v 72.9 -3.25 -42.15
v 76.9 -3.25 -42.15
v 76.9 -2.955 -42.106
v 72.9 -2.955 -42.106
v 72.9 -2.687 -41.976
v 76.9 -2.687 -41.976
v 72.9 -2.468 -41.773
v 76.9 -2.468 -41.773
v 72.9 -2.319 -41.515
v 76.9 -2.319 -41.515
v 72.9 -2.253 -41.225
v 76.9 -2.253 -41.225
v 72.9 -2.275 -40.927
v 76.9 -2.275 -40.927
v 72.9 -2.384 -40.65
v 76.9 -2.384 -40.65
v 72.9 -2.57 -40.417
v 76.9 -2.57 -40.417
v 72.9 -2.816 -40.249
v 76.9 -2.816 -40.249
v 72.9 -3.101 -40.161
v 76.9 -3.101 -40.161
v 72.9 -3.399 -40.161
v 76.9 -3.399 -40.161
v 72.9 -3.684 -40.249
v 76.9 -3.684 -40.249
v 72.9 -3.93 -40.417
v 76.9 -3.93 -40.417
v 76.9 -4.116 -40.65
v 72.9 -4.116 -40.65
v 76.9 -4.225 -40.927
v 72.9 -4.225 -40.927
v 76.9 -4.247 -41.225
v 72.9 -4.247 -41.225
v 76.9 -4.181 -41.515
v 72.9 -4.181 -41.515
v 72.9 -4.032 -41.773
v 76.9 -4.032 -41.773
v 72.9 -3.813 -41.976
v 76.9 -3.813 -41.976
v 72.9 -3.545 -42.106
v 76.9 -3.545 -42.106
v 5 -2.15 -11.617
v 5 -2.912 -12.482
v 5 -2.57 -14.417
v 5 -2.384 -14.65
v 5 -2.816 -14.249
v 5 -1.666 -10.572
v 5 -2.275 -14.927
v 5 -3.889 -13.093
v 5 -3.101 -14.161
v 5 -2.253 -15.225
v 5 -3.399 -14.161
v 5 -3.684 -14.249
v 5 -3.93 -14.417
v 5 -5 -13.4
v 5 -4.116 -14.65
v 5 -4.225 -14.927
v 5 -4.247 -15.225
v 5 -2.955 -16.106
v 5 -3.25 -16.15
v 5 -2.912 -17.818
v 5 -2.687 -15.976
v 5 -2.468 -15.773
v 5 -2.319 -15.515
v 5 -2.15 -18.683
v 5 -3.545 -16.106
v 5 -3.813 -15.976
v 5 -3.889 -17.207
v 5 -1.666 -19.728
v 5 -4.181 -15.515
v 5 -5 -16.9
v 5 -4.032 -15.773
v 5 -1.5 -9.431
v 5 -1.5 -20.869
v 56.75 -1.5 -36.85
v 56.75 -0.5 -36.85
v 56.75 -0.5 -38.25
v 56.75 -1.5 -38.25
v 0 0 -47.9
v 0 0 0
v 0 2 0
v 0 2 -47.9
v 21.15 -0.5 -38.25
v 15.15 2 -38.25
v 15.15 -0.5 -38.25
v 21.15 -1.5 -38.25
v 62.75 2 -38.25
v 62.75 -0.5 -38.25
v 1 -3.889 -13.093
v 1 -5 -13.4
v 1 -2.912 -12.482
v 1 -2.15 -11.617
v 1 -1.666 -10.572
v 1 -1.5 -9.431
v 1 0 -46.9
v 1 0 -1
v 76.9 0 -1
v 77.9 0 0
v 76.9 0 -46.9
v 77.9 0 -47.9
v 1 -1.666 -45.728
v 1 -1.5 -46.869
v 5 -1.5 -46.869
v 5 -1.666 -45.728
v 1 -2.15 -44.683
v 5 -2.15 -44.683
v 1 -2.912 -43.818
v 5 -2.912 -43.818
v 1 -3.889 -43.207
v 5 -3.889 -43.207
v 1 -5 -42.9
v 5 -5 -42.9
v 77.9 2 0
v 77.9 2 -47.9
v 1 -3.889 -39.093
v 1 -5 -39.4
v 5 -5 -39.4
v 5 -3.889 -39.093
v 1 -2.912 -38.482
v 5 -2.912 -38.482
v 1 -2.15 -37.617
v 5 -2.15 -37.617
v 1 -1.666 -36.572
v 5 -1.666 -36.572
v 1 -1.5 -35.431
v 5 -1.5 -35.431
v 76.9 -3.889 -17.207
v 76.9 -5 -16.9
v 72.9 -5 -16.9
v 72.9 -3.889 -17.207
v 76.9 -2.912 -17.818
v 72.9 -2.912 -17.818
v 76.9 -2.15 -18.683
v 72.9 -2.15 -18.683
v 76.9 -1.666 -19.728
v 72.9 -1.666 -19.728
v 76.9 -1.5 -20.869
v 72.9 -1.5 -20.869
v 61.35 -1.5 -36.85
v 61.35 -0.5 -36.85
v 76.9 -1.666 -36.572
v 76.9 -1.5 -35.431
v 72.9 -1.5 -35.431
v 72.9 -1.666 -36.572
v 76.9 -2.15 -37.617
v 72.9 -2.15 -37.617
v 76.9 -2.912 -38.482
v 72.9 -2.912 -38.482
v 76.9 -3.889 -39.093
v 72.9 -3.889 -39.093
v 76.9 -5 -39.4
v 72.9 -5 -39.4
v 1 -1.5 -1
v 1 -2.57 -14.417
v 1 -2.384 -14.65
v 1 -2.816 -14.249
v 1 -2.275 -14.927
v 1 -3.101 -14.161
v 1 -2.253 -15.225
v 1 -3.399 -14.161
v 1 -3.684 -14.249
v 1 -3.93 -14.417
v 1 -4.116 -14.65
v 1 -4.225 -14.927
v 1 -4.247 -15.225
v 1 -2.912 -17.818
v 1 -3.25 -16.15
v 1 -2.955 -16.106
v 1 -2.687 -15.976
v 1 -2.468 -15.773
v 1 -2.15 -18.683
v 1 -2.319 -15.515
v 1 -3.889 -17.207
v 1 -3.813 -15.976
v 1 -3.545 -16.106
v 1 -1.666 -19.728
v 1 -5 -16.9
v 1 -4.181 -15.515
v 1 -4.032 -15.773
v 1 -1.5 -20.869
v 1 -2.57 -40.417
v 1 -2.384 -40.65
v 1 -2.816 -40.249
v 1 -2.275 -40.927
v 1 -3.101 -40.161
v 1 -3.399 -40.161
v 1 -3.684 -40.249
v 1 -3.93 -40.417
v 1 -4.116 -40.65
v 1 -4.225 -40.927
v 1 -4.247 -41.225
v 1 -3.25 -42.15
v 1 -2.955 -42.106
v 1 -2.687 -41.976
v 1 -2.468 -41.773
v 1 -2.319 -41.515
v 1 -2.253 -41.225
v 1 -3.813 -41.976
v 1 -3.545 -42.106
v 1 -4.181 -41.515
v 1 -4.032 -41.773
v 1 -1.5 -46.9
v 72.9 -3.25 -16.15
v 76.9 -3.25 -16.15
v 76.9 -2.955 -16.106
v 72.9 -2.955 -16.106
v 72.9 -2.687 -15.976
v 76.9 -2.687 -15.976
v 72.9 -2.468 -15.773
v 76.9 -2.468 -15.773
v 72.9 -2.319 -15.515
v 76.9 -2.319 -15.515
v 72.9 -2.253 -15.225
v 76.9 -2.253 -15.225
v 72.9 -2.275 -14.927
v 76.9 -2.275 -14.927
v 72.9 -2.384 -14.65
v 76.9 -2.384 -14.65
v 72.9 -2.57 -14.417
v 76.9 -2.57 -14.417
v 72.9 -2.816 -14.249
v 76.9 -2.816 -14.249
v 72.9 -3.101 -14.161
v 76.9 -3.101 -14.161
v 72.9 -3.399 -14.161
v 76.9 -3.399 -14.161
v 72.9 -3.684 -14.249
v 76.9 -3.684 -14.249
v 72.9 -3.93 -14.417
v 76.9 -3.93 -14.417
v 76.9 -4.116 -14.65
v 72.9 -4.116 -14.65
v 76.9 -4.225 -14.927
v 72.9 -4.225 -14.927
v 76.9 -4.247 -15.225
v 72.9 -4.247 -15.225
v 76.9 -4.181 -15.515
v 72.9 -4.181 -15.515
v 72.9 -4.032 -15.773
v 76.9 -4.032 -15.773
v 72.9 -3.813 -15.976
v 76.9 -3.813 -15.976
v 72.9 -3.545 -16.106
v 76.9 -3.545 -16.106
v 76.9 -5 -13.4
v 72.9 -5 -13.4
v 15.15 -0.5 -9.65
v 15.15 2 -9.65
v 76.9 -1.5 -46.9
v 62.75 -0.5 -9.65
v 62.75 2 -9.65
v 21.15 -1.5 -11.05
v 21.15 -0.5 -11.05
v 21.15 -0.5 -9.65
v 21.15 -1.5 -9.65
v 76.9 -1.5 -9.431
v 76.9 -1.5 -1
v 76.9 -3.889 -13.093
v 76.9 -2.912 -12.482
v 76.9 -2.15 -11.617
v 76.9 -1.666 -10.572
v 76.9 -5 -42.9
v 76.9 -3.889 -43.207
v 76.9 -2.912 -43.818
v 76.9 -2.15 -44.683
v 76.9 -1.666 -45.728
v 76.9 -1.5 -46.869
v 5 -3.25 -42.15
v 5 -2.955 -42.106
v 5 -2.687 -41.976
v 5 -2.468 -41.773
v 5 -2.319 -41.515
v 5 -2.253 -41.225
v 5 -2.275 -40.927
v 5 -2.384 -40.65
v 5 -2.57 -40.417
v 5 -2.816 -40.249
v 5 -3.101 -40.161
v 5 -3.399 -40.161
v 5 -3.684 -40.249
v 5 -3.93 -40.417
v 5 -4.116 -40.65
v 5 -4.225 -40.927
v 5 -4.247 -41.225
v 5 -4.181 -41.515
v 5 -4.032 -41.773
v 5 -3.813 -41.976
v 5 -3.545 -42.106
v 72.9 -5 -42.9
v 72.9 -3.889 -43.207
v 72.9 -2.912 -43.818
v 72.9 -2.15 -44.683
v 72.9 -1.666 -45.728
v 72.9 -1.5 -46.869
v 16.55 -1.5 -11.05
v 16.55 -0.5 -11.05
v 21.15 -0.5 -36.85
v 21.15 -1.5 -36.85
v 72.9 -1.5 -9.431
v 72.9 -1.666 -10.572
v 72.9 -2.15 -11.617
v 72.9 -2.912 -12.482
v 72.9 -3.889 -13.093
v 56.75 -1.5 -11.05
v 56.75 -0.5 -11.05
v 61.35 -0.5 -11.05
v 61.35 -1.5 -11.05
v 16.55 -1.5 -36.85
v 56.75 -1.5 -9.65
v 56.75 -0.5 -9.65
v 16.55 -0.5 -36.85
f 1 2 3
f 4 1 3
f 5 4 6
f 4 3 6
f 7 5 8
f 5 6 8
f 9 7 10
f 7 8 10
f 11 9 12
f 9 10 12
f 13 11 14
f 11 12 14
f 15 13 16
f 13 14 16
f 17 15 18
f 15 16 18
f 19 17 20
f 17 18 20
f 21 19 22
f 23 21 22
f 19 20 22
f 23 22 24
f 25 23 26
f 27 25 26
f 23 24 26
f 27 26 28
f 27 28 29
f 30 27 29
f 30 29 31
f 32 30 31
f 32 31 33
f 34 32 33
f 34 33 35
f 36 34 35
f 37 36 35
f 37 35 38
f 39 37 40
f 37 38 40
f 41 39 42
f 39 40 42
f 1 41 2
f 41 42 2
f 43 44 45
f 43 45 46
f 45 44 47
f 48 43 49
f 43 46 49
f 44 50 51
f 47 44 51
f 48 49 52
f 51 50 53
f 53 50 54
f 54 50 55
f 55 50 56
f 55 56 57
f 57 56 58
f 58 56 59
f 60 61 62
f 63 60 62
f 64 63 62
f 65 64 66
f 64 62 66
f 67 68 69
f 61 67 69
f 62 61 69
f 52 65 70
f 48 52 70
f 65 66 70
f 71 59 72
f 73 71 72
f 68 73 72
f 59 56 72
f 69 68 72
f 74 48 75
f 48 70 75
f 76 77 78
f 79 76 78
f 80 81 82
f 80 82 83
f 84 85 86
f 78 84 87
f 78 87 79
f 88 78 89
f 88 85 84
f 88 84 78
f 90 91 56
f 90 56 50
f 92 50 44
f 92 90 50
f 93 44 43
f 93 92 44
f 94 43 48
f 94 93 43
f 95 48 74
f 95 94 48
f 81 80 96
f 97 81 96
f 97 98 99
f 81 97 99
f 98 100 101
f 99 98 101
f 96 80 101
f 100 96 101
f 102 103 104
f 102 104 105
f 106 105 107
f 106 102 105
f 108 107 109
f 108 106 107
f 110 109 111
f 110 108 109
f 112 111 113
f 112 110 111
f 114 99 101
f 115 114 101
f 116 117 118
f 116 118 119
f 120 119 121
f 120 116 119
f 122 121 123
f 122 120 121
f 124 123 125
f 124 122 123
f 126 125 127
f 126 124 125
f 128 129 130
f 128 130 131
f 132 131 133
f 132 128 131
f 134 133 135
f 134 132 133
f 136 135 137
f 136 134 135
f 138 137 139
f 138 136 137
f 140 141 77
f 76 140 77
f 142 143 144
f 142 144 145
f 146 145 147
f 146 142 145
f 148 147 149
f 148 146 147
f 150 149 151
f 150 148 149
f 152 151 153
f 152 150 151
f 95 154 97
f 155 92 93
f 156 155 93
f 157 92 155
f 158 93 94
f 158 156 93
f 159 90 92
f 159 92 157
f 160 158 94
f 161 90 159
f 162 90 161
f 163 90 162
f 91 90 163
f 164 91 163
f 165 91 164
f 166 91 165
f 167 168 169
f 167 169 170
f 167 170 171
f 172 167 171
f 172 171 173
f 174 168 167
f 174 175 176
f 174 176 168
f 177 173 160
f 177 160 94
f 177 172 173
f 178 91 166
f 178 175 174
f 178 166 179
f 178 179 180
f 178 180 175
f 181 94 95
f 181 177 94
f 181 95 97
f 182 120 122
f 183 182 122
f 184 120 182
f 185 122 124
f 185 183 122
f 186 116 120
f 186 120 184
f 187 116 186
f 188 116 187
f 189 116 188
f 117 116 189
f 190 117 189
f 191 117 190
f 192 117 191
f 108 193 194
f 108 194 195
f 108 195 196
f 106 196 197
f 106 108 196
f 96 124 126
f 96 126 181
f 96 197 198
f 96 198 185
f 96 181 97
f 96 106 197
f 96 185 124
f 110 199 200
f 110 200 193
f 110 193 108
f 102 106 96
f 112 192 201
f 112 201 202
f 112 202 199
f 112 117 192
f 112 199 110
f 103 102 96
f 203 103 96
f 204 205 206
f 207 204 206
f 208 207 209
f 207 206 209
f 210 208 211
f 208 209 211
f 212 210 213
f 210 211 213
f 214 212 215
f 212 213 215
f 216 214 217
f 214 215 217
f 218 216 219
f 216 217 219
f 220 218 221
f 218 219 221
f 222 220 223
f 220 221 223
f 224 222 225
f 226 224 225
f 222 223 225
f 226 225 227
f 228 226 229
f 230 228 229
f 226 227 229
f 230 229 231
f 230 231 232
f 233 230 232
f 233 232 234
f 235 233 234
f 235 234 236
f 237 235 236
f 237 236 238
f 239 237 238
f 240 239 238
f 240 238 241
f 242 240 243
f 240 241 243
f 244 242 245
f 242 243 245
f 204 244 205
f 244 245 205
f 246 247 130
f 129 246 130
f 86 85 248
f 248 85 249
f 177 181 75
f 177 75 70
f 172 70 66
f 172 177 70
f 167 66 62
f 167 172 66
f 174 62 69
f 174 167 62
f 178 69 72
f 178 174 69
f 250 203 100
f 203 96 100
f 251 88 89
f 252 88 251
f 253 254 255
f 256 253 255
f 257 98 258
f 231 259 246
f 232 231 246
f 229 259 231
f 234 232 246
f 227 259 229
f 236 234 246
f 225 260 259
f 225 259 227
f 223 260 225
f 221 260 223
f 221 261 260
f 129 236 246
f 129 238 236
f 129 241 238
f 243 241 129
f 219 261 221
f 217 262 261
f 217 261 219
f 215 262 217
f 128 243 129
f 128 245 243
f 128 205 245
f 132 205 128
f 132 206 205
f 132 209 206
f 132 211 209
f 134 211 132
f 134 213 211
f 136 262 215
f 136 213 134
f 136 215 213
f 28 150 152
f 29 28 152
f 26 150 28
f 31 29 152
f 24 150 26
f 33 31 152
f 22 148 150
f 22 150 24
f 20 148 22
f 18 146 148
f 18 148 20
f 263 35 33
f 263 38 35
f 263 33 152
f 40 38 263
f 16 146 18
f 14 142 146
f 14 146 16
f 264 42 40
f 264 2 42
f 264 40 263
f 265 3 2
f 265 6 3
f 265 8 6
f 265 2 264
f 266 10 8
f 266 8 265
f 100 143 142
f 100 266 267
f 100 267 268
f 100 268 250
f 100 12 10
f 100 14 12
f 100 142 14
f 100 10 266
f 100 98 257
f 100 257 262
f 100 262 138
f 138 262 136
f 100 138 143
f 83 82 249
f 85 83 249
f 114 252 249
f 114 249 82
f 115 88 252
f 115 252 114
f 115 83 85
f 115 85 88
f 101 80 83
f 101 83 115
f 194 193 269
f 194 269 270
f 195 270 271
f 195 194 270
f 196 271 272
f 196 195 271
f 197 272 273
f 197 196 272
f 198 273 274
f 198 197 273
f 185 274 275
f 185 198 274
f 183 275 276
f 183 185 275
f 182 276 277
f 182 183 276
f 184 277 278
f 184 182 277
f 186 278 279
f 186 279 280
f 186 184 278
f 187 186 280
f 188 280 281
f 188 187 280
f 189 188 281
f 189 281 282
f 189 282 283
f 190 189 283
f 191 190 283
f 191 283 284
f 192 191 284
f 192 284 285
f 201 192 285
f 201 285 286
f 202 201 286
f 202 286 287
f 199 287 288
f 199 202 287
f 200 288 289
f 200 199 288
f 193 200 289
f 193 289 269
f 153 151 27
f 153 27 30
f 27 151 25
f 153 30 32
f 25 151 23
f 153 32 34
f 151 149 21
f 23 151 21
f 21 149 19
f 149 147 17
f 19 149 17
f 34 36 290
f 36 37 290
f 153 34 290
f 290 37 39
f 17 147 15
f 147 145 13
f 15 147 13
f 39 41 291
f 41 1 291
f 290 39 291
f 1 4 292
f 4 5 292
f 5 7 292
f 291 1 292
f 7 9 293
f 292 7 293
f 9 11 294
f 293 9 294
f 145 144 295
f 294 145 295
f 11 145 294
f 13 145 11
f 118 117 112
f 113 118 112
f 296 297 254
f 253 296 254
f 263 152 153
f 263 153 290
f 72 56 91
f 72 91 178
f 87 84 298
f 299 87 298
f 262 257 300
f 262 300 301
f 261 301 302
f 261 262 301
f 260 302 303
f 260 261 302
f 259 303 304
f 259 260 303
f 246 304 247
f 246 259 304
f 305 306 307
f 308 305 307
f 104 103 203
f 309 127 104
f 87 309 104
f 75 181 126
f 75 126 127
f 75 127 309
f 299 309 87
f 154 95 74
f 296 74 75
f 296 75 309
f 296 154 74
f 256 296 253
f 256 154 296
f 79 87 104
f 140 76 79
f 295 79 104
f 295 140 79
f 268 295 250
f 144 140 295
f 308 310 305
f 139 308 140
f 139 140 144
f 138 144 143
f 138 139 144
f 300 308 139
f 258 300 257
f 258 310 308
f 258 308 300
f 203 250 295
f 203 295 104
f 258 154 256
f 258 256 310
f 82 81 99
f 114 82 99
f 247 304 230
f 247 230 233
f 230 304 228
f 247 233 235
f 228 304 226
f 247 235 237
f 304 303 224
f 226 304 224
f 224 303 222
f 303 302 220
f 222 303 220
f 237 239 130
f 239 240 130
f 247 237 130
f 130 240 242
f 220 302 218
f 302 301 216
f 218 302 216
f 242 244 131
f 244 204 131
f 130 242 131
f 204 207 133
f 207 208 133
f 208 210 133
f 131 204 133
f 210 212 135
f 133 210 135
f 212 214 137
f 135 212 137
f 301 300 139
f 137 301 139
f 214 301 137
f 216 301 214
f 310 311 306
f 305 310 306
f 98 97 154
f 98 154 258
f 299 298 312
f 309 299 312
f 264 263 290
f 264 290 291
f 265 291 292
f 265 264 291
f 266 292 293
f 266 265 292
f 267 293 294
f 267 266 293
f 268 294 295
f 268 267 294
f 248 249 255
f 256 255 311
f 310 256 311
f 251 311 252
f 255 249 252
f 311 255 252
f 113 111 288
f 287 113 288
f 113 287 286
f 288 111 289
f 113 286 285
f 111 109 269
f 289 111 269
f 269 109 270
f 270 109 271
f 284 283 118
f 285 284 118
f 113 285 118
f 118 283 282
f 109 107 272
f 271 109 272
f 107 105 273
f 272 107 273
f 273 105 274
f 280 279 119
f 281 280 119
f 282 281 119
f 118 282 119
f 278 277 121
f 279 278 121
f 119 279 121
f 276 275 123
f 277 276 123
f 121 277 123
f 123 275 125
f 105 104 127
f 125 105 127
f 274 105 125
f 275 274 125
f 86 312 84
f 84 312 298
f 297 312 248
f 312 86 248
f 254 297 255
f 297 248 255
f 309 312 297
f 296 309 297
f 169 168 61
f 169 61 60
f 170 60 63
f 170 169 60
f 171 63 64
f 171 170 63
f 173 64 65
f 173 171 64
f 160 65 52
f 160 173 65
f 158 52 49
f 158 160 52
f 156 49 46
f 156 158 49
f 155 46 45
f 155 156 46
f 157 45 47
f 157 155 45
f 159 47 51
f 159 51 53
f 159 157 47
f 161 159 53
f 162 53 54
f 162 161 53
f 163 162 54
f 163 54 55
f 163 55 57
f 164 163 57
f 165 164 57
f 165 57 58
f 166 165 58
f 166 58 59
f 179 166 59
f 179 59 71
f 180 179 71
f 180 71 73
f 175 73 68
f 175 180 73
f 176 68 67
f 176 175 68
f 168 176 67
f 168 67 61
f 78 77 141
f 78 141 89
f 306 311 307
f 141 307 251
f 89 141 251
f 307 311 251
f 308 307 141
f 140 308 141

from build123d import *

# Parameters (mm, degrees)
SKETCH_1_W             = 77.9
SKETCH_1_H             = 47.9
EXTRUDE_1_DEPTH        = 2
SKETCH_2_W             = 47.6
SKETCH_2_H             = 28.6
CUT_EXTRUDE_1_DEPTH    = 27
SKETCH_4_W             = 75.9
SKETCH_4_H             = 45.9
SKETCH_4_W_2           = 47.6
SKETCH_4_H_2           = 28.6
EXTRUDE_3_DEPTH        = 0.5
SKETCH_5_W             = 75.9
SKETCH_5_H             = 45.9
SKETCH_5_W_2           = 47.6
SKETCH_5_H_2           = 28.6
EXTRUDE_4_DEPTH        = 1
SKETCH_8_W             = 3.5
SKETCH_8_H             = 3.5
SKETCH_8_R             = 1
EXTRUDE_5_DEPTH        = 4
FILLET_1_R             = 4
FILLET_1_OF_MIRROR_1_R = 4


with BuildPart() as part:
    # 草图1 → 凸台-拉伸1 (new body)
    with BuildSketch(Plane(origin=(0, 0, 0), x_dir=(1, 0, 0), z_dir=(0, 1, 0))):
        with Locations((38.95, 23.95)):
            Rectangle(SKETCH_1_W, SKETCH_1_H)
    extrude(amount=EXTRUDE_1_DEPTH)

    # 草图2 → 切除-拉伸1 (cut)
    with BuildSketch(Plane(origin=(0, 2, 0), x_dir=(1, 0, 0), z_dir=(0, 1, 0))):
        with Locations((38.95, 23.95)):
            Rectangle(SKETCH_2_W, SKETCH_2_H)
    extrude(amount=-CUT_EXTRUDE_1_DEPTH, mode=Mode.SUBTRACT)

    # 草图4 → 凸台-拉伸3 (add)
    with BuildSketch(Plane.XZ):
        with Locations((38.95, -23.95)):
            Rectangle(SKETCH_4_W, SKETCH_4_H)
        with Locations((38.95, -23.95)):
            Rectangle(SKETCH_4_W_2, SKETCH_4_H_2, mode=Mode.SUBTRACT)
    extrude(amount=EXTRUDE_3_DEPTH)

    # 草图5 → 凸台-拉伸4 (add)
    # profile 1 of 3: a face of its own
    with BuildSketch(Plane.XZ.offset(0.5)):
        with Locations((38.95, -23.95)):
            Rectangle(SKETCH_5_W, SKETCH_5_H)
        with Locations((38.95, -23.95)):
            Rectangle(SKETCH_5_W_2, SKETCH_5_H_2, mode=Mode.SUBTRACT)
    # profile 2 of 3: a face of its own
    with BuildSketch(Plane.XZ.offset(0.5)):
        Polygon((15.15, -38.25), (21.15, -38.25), (21.15, -36.85), (16.55, -36.85), (16.55, -11.05), (21.15, -11.05), (21.15, -9.65), (15.15, -9.65), align=None)
    # profile 3 of 3: a face of its own
    with BuildSketch(Plane.XZ.offset(0.5)):
        Polygon((61.35, -11.05), (61.35, -36.85), (56.75, -36.85), (56.75, -38.25), (62.75, -38.25), (62.75, -9.65), (56.75, -9.65), (56.75, -11.05), align=None)
    extrude(amount=EXTRUDE_4_DEPTH)

    # 草图8 → 凸台-拉伸5 (add)
    # profile 1 of 2: a face of its own
    with BuildSketch(Plane(origin=(76.9, 0, 0), x_dir=(0, 0, -1), z_dir=(1, 0, 0))):
        with Locations((41.15, -3.25)):
            Rectangle(SKETCH_8_W, SKETCH_8_H)
        with Locations((41.15, -3.25)):
            Circle(SKETCH_8_R, mode=Mode.SUBTRACT)
    # profile 2 of 2: a face of its own
    with BuildSketch(Plane(origin=(76.9, 0, 0), x_dir=(0, 0, -1), z_dir=(1, 0, 0))):
        with Locations((15.15, -3.25)):
            Rectangle(SKETCH_8_W, SKETCH_8_H)
        with Locations((15.15, -3.25)):
            Circle(SKETCH_8_R, mode=Mode.SUBTRACT)
    extrude_5 = extrude(amount=-EXTRUDE_5_DEPTH)

    # 圆角1
    # the kernel refuses this fillet: 4 mm, written as the material it adds along each edge
    with BuildSketch(Plane(origin=(76.9, -1.5, -42.9), x_dir=(0, 0, -1), z_dir=(-1, 0, 0)), Plane(origin=(76.9, -1.5, -16.9), x_dir=(0, 0, -1), z_dir=(-1, 0, 0))) as fillet_1_piece_1:
        with BuildLine():
            CenterArc((3.968626967, 4), FILLET_1_R, 187.180755781, 82.819244219)
            Line((0, 3.5), (-0.079372539, 3.49))
            ThreePointArc((-0.079372539, 3.49), (-0.08, 1.75), (-0.08, 0))
            Line((-0.08, 0), (0, -0.08))
            Line((0, -0.08), (3.968626967, -0.08))
            Line((3.968626967, -0.08), (3.968626967, 0))
        make_face()
    extrude(amount=4)
    with BuildSketch(Plane(origin=(76.9, -1.5, -13.4), x_dir=(0, 0, 1), z_dir=(-1, 0, 0)), Plane(origin=(76.9, -1.5, -39.4), x_dir=(0, 0, 1), z_dir=(-1, 0, 0))) as fillet_1_piece_2:
        with BuildLine():
            CenterArc((3.968626967, -4), FILLET_1_R, 90, 82.819244219)
            Line((0, -3.5), (-0.079372539, -3.49))
            ThreePointArc((-0.079372539, -3.49), (-0.08, -1.75), (-0.08, 0))
            Line((-0.08, 0), (0, 0.08))
            Line((0, 0.08), (3.968626967, 0.08))
            Line((3.968626967, 0.08), (3.968626967, 0))
        make_face()
    extrude(amount=4)

    # 镜向1: 凸台-拉伸5 across plane
    add(extrude_5.mirror(Plane(origin=(38.95, 0, 0), x_dir=(0, 0, 1), z_dir=(1, 0, 0))))

    # 圆角1 of 镜向1
    # the kernel refuses this fillet: 4 mm, written as the material it adds along each edge
    with BuildSketch(Plane(origin=(1, -1.5, -42.9), x_dir=(0, 0, -1), z_dir=(1, 0, 0)), Plane(origin=(1, -1.5, -16.9), x_dir=(0, 0, -1), z_dir=(1, 0, 0))) as fillet_1_of_mirror_1_piece_1:
        with BuildLine():
            CenterArc((3.968626967, -4), FILLET_1_OF_MIRROR_1_R, 90, 82.819244219)
            Line((0, -3.5), (-0.079372539, -3.49))
            ThreePointArc((-0.079372539, -3.49), (-0.08, -1.75), (-0.08, 0))
            Line((-0.08, 0), (0, 0.08))
            Line((0, 0.08), (3.968626967, 0.08))
            Line((3.968626967, 0.08), (3.968626967, 0))
        make_face()
    extrude(amount=4)
    with BuildSketch(Plane(origin=(1, -1.5, -13.4), x_dir=(0, 0, 1), z_dir=(1, 0, 0)), Plane(origin=(1, -1.5, -39.4), x_dir=(0, 0, 1), z_dir=(1, 0, 0))) as fillet_1_of_mirror_1_piece_2:
        with BuildLine():
            CenterArc((3.968626967, 4), FILLET_1_OF_MIRROR_1_R, 187.180755781, 82.819244219)
            Line((0, 3.5), (-0.079372539, 3.49))
            ThreePointArc((-0.079372539, 3.49), (-0.08, 1.75), (-0.08, 0))
            Line((-0.08, 0), (0, -0.08))
            Line((0, -0.08), (3.968626967, -0.08))
            Line((3.968626967, -0.08), (3.968626967, 0))
        make_face()
    extrude(amount=4)


solid = part.part
